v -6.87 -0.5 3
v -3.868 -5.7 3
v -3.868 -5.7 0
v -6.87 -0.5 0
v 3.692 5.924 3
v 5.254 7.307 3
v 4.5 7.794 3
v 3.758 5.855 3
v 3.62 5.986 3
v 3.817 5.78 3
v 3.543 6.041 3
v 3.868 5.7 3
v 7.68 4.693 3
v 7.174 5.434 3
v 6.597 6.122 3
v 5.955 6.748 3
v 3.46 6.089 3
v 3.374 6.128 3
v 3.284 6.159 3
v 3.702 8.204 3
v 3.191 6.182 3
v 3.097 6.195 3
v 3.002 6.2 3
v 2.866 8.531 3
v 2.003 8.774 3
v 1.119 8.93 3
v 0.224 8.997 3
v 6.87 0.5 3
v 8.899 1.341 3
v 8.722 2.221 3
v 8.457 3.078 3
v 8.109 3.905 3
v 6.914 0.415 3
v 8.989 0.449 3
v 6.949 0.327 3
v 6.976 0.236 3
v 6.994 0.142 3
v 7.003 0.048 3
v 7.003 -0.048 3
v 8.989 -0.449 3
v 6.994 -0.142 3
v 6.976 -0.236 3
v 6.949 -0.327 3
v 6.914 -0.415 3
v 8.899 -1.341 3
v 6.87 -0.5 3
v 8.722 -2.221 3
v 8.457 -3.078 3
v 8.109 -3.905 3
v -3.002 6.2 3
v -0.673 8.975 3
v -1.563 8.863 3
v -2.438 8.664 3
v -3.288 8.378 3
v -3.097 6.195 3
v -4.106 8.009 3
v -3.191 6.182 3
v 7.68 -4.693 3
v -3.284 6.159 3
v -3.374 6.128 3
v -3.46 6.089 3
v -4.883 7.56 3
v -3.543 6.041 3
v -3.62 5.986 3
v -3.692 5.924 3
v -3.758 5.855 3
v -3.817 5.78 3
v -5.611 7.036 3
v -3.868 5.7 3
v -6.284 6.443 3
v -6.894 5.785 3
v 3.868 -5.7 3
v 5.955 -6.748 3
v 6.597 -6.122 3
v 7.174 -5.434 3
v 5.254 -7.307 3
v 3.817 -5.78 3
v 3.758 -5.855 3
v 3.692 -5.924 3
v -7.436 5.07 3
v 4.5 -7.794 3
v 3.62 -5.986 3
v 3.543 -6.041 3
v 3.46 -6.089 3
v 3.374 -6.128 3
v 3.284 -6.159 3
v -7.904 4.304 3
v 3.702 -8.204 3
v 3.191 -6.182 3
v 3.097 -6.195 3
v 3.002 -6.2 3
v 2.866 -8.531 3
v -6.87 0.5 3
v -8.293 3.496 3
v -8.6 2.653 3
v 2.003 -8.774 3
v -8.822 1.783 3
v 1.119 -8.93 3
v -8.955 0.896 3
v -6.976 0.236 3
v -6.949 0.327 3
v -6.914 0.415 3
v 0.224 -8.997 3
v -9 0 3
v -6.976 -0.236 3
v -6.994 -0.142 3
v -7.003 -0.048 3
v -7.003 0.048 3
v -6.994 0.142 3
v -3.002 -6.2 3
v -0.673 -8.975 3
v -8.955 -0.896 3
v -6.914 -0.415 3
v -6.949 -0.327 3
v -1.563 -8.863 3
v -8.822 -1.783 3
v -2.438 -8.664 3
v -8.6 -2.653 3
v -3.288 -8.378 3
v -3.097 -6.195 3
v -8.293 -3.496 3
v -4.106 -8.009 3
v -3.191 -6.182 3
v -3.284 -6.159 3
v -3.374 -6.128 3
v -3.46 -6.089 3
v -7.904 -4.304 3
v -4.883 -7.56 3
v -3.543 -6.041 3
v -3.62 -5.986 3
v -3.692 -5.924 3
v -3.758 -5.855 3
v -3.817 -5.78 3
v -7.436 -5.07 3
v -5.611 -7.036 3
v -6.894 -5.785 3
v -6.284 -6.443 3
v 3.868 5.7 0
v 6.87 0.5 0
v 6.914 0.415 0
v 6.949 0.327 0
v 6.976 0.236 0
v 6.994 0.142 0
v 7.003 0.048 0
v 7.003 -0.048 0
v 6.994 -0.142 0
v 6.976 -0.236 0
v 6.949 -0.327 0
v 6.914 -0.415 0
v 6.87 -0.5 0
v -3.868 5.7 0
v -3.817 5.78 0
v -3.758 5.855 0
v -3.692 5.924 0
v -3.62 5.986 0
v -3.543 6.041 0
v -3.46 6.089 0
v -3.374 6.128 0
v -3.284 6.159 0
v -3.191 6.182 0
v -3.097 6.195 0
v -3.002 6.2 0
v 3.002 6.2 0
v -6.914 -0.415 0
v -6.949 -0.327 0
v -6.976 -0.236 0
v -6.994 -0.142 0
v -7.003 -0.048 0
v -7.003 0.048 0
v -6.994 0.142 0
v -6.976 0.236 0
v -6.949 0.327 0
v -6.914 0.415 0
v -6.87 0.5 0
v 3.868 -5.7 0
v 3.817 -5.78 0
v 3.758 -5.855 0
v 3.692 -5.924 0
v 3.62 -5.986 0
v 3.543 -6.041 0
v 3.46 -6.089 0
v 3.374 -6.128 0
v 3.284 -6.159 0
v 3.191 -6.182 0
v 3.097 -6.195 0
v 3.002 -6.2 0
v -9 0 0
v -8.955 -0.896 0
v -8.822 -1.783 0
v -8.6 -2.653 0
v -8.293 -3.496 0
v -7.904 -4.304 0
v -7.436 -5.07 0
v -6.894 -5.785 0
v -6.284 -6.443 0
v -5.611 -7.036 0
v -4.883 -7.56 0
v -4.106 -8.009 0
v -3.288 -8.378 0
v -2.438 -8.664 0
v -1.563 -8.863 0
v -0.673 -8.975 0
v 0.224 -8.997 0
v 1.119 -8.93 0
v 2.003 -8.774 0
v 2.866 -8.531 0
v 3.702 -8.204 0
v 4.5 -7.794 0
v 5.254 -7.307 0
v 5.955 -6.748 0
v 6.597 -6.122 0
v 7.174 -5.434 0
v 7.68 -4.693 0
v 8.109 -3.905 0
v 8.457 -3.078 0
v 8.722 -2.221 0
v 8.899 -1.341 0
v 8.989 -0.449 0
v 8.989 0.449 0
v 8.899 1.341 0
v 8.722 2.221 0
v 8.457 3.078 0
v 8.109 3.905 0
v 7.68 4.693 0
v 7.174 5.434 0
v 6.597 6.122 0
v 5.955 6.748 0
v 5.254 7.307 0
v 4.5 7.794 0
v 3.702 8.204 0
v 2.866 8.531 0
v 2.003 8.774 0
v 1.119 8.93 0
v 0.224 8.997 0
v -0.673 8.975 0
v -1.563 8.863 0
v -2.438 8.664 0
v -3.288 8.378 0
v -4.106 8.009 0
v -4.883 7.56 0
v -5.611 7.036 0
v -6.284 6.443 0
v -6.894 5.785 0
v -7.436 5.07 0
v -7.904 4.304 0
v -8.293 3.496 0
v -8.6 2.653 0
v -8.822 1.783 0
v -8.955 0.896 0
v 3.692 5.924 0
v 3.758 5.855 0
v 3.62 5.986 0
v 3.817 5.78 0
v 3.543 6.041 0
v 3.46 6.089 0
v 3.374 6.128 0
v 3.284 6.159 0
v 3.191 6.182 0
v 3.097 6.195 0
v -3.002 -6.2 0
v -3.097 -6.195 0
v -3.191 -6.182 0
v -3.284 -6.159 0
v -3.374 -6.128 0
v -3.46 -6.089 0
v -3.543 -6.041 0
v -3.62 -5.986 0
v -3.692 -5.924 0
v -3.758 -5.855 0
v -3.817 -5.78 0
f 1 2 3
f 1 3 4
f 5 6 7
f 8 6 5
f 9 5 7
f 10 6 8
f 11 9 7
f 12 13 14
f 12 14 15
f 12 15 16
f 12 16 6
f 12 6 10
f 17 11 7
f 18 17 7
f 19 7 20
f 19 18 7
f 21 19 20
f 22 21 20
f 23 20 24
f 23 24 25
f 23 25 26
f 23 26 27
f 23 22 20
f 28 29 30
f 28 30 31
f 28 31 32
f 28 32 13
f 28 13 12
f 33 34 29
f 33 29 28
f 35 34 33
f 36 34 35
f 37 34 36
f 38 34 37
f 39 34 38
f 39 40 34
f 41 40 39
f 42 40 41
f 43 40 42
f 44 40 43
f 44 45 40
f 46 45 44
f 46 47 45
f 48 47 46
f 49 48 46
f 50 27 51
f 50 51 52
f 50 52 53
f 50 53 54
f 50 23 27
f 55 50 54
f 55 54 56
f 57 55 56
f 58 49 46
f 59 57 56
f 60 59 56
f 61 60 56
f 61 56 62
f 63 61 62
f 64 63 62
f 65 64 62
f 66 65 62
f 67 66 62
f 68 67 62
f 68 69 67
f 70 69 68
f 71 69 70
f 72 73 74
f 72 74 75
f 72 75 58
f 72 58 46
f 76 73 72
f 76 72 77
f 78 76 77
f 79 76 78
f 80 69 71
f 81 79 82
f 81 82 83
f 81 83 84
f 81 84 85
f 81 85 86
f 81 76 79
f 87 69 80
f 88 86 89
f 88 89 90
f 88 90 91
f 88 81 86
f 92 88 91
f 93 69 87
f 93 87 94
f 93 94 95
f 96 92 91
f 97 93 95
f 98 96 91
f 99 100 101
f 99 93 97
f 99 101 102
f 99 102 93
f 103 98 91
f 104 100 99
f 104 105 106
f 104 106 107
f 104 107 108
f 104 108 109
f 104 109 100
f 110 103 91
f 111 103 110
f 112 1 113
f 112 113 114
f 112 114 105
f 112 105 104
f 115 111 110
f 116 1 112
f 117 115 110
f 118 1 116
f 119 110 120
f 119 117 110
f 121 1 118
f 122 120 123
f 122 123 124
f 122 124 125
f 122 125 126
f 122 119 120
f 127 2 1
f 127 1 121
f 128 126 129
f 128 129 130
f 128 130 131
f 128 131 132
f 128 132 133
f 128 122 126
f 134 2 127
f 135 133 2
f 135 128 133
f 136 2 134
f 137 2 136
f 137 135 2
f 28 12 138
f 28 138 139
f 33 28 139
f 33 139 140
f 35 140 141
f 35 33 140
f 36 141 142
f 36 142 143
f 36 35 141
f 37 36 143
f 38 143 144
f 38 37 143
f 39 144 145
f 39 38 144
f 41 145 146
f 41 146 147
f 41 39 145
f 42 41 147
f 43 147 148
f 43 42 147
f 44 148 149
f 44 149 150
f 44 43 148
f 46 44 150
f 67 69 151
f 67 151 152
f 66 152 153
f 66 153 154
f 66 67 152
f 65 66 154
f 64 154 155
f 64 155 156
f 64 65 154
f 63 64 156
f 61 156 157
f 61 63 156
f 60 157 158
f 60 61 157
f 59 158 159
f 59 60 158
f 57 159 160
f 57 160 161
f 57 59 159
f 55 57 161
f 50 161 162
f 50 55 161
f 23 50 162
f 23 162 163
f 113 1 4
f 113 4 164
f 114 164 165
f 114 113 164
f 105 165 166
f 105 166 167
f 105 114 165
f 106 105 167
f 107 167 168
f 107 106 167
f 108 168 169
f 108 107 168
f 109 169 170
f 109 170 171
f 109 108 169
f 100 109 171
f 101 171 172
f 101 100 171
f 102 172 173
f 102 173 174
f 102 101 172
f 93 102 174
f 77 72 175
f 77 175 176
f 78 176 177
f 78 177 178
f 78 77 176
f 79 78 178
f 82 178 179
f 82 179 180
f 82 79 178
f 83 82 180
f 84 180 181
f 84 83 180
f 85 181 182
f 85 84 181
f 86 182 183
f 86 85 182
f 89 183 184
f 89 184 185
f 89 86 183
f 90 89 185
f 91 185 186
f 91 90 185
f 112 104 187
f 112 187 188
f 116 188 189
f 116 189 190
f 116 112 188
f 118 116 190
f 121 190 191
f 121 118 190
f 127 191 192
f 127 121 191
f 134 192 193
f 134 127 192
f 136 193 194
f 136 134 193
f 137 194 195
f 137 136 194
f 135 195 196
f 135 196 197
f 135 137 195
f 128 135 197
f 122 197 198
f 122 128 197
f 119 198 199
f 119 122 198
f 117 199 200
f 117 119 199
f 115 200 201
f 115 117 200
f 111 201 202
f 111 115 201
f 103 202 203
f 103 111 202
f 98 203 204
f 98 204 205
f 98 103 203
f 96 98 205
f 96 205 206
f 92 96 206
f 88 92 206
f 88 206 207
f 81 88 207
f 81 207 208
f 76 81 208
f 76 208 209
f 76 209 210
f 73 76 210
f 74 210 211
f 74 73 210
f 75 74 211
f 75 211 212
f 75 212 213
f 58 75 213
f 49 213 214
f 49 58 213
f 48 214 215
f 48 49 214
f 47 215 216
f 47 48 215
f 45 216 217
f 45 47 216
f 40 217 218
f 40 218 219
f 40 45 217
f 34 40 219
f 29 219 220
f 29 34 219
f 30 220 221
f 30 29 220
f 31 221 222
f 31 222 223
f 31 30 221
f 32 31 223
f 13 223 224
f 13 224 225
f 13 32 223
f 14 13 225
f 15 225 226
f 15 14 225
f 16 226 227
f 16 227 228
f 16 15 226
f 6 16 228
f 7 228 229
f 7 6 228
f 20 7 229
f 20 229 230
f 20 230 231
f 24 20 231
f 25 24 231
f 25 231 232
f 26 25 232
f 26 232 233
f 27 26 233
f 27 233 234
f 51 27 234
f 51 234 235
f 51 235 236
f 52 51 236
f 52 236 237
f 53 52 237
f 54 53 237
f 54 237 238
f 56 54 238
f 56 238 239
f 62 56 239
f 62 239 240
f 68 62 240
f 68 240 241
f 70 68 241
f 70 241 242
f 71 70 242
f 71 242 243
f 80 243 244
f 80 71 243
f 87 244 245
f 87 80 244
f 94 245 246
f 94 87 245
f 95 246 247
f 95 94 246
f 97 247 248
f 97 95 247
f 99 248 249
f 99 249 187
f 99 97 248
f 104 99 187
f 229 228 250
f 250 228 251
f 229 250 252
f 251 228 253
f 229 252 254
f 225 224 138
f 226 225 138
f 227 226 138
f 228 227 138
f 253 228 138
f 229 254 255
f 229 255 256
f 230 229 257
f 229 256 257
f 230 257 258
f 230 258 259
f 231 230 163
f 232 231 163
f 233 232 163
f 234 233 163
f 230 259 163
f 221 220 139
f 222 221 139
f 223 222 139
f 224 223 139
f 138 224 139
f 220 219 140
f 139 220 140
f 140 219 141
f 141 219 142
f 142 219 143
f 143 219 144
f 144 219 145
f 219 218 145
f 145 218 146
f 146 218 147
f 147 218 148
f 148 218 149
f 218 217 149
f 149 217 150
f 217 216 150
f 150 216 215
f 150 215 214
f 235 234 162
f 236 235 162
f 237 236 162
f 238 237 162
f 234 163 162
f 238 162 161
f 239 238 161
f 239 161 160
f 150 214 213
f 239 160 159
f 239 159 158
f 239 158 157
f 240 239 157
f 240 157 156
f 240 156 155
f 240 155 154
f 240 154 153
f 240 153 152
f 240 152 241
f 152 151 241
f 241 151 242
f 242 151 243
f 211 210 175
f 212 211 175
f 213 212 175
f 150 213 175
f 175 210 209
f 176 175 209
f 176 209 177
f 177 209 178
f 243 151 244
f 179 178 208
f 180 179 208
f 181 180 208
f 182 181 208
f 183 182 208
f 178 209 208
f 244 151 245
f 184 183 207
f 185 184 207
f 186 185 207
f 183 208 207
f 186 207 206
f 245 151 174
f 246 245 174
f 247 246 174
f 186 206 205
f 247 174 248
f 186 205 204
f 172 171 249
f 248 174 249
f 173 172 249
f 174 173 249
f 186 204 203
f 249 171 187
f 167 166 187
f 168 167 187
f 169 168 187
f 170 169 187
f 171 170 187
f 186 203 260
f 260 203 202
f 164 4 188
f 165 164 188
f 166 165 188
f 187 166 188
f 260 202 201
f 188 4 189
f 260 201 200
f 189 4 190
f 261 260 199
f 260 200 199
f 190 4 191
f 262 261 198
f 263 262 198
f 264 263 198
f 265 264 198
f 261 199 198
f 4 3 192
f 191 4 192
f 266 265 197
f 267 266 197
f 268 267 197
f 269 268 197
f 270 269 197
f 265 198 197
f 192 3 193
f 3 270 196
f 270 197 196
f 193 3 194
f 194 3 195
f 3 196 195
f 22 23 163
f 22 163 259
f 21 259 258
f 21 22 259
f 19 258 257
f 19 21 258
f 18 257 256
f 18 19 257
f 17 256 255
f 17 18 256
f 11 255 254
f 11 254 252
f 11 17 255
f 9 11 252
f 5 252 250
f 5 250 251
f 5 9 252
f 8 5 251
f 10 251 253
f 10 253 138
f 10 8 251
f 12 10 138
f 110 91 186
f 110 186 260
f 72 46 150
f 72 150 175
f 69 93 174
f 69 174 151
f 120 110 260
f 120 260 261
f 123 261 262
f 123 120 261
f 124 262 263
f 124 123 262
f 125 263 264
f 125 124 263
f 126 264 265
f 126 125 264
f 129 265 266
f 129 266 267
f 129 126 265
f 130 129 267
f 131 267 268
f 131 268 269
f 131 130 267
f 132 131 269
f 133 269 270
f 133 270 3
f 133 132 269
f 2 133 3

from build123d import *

# Parameters (mm, degrees)
SKETCH1_R           = 9
BOSS_EXTRUDE1_DEPTH = 3


with BuildPart() as part:
    # Sketch1 → Boss-Extrude1 (new body)
    with BuildSketch(Plane.XY.offset(3)):
        with Locations(Location((0, 0, 0), (0, 0, 180))):
            Circle(SKETCH1_R)
        with BuildLine():
            Line((-3.0022214, 6.2), (3.0022214, 6.2))
            ThreePointArc((3.0022214, 6.2), (3.5022214, 6.066025404), (3.868246804, 5.7))
            Line((3.868246804, 5.7), (6.870468203, 0.5))
            ThreePointArc((6.870468203, 0.5), (7.0044428, 0), (6.870468203, -0.5))
            Line((6.870468203, -0.5), (3.868246804, -5.7))
            ThreePointArc((3.868246804, -5.7), (3.5022214, -6.066025404), (3.0022214, -6.2))
            Line((3.0022214, -6.2), (-3.0022214, -6.2))
            ThreePointArc((-3.0022214, -6.2), (-3.5022214, -6.066025404), (-3.868246804, -5.7))
            Line((-3.868246804, -5.7), (-6.870468203, -0.5))
            ThreePointArc((-6.870468203, -0.5), (-7.0044428, 0), (-6.870468203, 0.5))
            Line((-6.870468203, 0.5), (-3.868246804, 5.7))
            ThreePointArc((-3.868246804, 5.7), (-3.5022214, 6.066025404), (-3.0022214, 6.2))
        make_face(mode=Mode.SUBTRACT)
    extrude(amount=-BOSS_EXTRUDE1_DEPTH)


solid = part.part
